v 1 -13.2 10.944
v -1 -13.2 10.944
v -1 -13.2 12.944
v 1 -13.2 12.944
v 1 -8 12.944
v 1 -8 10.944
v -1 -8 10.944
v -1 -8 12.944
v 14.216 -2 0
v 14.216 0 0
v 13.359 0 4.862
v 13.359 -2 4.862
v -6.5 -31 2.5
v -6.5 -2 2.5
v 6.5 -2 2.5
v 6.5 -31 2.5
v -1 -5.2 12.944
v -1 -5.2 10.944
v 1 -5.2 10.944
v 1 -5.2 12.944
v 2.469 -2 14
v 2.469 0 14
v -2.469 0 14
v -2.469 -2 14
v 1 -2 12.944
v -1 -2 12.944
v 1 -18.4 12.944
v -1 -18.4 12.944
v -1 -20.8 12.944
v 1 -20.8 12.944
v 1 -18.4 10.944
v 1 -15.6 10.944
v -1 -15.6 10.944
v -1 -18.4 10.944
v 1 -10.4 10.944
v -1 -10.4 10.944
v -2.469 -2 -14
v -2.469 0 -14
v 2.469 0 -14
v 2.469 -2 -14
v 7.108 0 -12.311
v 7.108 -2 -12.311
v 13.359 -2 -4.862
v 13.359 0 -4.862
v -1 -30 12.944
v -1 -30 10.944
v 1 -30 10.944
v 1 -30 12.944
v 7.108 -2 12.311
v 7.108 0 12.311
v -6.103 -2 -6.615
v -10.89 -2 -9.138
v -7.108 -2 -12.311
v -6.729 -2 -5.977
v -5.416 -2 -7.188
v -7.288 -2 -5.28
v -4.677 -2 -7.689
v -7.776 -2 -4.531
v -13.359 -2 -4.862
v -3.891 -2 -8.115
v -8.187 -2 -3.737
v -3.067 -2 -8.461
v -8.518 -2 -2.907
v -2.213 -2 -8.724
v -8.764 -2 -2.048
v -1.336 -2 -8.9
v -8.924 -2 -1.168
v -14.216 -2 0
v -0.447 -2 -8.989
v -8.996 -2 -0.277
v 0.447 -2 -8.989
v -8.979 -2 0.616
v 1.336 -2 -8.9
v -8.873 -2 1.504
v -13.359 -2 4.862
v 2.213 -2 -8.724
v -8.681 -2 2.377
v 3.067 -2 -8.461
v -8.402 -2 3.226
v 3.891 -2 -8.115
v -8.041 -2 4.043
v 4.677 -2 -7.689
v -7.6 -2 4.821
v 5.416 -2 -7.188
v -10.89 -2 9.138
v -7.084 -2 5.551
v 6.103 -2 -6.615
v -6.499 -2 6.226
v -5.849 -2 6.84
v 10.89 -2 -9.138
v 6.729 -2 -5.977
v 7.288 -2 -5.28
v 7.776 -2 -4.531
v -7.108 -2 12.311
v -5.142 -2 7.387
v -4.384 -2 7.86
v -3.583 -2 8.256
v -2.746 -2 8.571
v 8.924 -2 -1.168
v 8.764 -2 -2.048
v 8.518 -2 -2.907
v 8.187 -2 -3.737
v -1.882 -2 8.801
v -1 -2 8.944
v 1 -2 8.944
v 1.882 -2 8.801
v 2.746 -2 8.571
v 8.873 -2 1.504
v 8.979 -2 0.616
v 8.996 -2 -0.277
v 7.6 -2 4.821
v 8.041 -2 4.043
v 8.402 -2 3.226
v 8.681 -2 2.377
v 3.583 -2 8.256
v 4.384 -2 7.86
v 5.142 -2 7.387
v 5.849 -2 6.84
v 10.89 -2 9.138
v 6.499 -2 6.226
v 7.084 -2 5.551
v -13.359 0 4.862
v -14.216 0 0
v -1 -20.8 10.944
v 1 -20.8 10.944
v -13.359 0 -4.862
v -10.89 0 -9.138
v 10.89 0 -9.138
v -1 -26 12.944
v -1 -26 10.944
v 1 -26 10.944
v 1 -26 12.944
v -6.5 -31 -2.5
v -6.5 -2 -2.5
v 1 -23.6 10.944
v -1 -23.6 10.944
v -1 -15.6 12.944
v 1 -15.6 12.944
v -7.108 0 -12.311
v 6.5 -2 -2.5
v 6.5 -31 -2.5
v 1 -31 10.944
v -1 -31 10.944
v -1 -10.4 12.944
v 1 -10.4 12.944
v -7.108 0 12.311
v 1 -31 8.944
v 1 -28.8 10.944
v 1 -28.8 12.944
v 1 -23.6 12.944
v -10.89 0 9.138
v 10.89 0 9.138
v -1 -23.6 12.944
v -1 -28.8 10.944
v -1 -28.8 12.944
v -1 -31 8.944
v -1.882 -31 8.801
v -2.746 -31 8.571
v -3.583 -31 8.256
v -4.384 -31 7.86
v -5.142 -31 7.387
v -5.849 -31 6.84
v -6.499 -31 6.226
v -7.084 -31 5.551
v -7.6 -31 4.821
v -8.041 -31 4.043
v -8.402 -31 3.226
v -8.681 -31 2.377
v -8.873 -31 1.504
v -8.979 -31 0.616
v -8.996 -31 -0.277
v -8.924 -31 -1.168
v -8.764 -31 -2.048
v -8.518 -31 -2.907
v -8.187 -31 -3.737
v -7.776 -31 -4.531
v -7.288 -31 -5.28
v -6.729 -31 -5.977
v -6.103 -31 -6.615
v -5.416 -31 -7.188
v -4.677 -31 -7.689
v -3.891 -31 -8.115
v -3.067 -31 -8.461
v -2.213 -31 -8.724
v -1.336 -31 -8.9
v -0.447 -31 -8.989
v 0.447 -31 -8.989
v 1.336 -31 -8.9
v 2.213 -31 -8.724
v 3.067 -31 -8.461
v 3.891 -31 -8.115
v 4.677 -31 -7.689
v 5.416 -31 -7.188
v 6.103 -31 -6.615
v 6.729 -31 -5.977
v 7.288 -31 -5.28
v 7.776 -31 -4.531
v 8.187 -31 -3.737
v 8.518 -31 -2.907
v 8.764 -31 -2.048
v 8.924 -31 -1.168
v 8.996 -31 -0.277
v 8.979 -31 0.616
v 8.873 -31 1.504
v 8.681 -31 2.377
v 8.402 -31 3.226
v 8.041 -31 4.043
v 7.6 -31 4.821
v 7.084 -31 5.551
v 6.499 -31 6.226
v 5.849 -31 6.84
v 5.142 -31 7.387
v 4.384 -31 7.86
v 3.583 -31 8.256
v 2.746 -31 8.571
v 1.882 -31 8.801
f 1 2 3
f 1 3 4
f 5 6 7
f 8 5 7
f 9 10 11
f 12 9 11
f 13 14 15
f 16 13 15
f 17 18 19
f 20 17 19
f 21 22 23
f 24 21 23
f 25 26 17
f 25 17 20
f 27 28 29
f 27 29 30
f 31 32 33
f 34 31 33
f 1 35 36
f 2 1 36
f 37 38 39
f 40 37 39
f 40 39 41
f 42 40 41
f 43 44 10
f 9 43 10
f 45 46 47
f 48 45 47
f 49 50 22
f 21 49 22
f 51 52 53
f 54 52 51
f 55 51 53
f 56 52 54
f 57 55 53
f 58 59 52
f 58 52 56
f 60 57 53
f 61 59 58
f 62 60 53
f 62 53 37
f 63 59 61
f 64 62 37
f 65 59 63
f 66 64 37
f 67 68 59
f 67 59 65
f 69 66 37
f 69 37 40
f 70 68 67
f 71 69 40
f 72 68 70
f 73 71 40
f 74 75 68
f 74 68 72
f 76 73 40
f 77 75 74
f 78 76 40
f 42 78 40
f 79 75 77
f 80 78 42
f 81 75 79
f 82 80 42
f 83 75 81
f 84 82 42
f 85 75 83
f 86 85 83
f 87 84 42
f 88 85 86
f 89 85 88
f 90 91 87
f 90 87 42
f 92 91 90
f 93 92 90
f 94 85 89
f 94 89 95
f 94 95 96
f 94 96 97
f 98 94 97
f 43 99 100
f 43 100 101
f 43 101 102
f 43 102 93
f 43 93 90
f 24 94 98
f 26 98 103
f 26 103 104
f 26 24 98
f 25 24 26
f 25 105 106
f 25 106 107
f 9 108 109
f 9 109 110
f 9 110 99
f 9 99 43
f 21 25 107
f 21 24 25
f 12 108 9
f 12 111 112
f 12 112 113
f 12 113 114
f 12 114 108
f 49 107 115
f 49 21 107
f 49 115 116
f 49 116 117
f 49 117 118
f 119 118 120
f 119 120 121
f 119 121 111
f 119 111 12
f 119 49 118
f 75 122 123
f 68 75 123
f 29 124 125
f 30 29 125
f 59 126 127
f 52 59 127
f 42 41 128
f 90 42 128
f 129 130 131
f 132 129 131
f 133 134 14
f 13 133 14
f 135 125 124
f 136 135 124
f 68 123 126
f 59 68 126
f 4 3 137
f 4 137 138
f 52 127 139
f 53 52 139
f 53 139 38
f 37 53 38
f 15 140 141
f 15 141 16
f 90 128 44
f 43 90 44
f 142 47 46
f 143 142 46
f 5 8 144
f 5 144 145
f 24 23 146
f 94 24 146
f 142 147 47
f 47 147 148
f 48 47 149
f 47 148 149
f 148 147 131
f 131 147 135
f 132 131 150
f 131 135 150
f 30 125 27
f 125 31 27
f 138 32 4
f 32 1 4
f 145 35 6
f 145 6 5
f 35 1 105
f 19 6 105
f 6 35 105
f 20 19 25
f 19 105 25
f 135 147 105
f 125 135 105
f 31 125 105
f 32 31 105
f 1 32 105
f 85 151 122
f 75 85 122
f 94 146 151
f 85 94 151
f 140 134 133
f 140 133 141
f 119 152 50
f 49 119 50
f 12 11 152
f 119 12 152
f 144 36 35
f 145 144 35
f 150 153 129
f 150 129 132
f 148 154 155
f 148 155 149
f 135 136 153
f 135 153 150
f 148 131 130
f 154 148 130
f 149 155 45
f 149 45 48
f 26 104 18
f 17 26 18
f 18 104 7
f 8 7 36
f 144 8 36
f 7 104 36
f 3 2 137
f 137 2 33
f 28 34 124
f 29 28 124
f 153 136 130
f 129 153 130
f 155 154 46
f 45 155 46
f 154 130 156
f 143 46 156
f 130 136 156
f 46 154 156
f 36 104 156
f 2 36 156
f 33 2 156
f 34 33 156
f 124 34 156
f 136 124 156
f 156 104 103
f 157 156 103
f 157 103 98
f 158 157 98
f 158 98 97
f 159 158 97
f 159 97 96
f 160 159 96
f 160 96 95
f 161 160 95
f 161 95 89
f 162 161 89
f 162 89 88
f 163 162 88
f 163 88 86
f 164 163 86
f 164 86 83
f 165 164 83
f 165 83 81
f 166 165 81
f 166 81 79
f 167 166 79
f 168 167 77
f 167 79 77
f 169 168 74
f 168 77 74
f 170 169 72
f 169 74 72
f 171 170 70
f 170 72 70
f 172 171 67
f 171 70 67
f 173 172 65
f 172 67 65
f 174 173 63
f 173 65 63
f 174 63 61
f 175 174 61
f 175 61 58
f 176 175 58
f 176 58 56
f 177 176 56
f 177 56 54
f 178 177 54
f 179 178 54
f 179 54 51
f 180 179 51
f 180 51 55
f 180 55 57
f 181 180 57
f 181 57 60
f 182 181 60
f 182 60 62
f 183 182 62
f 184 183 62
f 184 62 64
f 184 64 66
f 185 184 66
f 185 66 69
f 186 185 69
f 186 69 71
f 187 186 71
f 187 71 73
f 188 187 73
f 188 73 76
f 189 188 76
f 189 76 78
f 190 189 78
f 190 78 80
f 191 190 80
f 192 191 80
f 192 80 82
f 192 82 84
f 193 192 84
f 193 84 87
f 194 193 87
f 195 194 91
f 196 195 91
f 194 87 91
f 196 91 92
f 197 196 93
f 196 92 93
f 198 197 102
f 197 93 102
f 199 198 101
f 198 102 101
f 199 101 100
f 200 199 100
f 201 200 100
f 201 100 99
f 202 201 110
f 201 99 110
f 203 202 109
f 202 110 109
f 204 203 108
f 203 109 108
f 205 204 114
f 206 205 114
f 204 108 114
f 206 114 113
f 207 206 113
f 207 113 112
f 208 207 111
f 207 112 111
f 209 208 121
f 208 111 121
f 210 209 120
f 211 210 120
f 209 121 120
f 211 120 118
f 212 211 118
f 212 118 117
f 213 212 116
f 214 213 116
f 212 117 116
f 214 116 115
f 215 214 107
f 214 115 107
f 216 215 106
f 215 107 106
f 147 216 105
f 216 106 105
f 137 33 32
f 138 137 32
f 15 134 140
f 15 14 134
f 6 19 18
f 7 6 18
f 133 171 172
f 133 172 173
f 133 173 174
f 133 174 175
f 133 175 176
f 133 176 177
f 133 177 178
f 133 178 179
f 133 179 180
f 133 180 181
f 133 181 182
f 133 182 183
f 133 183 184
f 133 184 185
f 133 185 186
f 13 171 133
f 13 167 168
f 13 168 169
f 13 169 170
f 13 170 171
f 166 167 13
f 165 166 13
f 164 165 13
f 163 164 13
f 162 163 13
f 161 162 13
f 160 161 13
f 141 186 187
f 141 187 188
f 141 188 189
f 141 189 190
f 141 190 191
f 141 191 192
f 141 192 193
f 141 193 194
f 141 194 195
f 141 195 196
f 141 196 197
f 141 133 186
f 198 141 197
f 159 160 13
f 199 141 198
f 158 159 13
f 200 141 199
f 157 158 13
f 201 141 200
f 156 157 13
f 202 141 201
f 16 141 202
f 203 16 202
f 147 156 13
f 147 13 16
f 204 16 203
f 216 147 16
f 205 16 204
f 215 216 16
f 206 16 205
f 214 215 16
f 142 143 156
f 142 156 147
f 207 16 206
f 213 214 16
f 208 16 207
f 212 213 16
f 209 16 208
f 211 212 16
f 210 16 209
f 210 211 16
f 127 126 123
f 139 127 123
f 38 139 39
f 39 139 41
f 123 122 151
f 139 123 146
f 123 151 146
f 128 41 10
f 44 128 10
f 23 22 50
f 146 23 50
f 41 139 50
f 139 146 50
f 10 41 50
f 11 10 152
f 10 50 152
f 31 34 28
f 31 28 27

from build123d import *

# Parameters (mm, degrees)
F0_W     = 14
F0_H     = 5
F1_DEPTH = 2
F2_W     = 13
F2_H     = 5
F3_DEPTH = 31
F4_W     = 2
F4_H     = 1.2
F5_DEPTH = 2


with BuildPart() as f1:
    # F0 (on Front) → F1 (new body)
    with BuildSketch(Plane.XZ):
        Polygon((2.468578, 14), (-2.468578, 14), (-7.107986, 12.311393), (-10.890067, 9.137851), (-13.358645, 4.862149), (-14.215973, 0), (-13.358645, -4.862149), (-10.890067, -9.137851), (-7.107986, -12.311393), (-2.468578, -14), (2.468578, -14), (7.107986, -12.311393), (10.890067, -9.137851), (13.358645, -4.862149), (14.215973, 0), (13.358645, 4.862149), (10.890067, 9.137851), (7.107986, 12.311393), align=None)
        with BuildLine():
            ThreePointArc((1, 8.944272), (6.708204, 6), (9, 0))
            ThreePointArc((9, 0), (-6, -6.708204), (-1, 8.944272))
            Line((-1, 8.944272), (-1, 10.944272))
            Line((-1, 10.944272), (1, 10.944272))
            Line((1, 10.944272), (1, 8.944272))
        make_face(mode=Mode.SUBTRACT)
        with BuildLine():
            ThreePointArc((-1, 8.944272), (0, 9), (1, 8.944272))
            Line((1, 8.944272), (1, 10.944272))
            Line((1, 10.944272), (-1, 10.944272))
            Line((-1, 10.944272), (-1, 8.944272))
        make_face()
        with BuildLine():
            ThreePointArc((-1, 8.944272), (-6, -6.708204), (9, 0))
            ThreePointArc((9, 0), (6.708204, 6), (1, 8.944272))
            ThreePointArc((1, 8.944272), (0, 9), (-1, 8.944272))
        make_face()
        Rectangle(F0_W, F0_H, mode=Mode.SUBTRACT)
        Rectangle(F0_W, F0_H)
    extrude(amount=F1_DEPTH)

    # F2 (on Front) → F3 (join)
    with BuildSketch(Plane.XZ):
        with BuildLine():
            Line((-1, 10.944272), (-1, 8.944272))
            ThreePointArc((-1, 8.944272), (0, -9), (1, 8.944272))
            Line((1, 8.944272), (1, 10.944272))
            Line((1, 10.944272), (-1, 10.944272))
        make_face()
        Rectangle(F2_W, F2_H, mode=Mode.SUBTRACT)
    extrude(amount=F3_DEPTH)

    # F4 (on face) → F5 (join)
    with BuildSketch(Plane.XY.offset(10.944272)):
        Polygon((1, -4), (1, -2), (-1, -2), (-1, -4), (-1, -5.2), (1, -5.2), align=None)
        Polygon((1, -9.2), (1, -8), (-1, -8), (-1, -9.2), (-1, -10.4), (1, -10.4), align=None)
        with Locations((0, -13.8)):
            Rectangle(F4_W, F4_H)
        with Locations((0, -15)):
            Rectangle(F4_W, F4_H)
        with Locations((0, -19)):
            Rectangle(F4_W, F4_H)
        with Locations((0, -20.2)):
            Rectangle(F4_W, F4_H)
        with Locations((0, -24.2)):
            Rectangle(F4_W, F4_H)
        with Locations((0, -25.4)):
            Rectangle(F4_W, F4_H)
        with Locations((0, -29.4)):
            Rectangle(F4_W, F4_H)
    extrude(amount=F5_DEPTH)


solid = f1.part
